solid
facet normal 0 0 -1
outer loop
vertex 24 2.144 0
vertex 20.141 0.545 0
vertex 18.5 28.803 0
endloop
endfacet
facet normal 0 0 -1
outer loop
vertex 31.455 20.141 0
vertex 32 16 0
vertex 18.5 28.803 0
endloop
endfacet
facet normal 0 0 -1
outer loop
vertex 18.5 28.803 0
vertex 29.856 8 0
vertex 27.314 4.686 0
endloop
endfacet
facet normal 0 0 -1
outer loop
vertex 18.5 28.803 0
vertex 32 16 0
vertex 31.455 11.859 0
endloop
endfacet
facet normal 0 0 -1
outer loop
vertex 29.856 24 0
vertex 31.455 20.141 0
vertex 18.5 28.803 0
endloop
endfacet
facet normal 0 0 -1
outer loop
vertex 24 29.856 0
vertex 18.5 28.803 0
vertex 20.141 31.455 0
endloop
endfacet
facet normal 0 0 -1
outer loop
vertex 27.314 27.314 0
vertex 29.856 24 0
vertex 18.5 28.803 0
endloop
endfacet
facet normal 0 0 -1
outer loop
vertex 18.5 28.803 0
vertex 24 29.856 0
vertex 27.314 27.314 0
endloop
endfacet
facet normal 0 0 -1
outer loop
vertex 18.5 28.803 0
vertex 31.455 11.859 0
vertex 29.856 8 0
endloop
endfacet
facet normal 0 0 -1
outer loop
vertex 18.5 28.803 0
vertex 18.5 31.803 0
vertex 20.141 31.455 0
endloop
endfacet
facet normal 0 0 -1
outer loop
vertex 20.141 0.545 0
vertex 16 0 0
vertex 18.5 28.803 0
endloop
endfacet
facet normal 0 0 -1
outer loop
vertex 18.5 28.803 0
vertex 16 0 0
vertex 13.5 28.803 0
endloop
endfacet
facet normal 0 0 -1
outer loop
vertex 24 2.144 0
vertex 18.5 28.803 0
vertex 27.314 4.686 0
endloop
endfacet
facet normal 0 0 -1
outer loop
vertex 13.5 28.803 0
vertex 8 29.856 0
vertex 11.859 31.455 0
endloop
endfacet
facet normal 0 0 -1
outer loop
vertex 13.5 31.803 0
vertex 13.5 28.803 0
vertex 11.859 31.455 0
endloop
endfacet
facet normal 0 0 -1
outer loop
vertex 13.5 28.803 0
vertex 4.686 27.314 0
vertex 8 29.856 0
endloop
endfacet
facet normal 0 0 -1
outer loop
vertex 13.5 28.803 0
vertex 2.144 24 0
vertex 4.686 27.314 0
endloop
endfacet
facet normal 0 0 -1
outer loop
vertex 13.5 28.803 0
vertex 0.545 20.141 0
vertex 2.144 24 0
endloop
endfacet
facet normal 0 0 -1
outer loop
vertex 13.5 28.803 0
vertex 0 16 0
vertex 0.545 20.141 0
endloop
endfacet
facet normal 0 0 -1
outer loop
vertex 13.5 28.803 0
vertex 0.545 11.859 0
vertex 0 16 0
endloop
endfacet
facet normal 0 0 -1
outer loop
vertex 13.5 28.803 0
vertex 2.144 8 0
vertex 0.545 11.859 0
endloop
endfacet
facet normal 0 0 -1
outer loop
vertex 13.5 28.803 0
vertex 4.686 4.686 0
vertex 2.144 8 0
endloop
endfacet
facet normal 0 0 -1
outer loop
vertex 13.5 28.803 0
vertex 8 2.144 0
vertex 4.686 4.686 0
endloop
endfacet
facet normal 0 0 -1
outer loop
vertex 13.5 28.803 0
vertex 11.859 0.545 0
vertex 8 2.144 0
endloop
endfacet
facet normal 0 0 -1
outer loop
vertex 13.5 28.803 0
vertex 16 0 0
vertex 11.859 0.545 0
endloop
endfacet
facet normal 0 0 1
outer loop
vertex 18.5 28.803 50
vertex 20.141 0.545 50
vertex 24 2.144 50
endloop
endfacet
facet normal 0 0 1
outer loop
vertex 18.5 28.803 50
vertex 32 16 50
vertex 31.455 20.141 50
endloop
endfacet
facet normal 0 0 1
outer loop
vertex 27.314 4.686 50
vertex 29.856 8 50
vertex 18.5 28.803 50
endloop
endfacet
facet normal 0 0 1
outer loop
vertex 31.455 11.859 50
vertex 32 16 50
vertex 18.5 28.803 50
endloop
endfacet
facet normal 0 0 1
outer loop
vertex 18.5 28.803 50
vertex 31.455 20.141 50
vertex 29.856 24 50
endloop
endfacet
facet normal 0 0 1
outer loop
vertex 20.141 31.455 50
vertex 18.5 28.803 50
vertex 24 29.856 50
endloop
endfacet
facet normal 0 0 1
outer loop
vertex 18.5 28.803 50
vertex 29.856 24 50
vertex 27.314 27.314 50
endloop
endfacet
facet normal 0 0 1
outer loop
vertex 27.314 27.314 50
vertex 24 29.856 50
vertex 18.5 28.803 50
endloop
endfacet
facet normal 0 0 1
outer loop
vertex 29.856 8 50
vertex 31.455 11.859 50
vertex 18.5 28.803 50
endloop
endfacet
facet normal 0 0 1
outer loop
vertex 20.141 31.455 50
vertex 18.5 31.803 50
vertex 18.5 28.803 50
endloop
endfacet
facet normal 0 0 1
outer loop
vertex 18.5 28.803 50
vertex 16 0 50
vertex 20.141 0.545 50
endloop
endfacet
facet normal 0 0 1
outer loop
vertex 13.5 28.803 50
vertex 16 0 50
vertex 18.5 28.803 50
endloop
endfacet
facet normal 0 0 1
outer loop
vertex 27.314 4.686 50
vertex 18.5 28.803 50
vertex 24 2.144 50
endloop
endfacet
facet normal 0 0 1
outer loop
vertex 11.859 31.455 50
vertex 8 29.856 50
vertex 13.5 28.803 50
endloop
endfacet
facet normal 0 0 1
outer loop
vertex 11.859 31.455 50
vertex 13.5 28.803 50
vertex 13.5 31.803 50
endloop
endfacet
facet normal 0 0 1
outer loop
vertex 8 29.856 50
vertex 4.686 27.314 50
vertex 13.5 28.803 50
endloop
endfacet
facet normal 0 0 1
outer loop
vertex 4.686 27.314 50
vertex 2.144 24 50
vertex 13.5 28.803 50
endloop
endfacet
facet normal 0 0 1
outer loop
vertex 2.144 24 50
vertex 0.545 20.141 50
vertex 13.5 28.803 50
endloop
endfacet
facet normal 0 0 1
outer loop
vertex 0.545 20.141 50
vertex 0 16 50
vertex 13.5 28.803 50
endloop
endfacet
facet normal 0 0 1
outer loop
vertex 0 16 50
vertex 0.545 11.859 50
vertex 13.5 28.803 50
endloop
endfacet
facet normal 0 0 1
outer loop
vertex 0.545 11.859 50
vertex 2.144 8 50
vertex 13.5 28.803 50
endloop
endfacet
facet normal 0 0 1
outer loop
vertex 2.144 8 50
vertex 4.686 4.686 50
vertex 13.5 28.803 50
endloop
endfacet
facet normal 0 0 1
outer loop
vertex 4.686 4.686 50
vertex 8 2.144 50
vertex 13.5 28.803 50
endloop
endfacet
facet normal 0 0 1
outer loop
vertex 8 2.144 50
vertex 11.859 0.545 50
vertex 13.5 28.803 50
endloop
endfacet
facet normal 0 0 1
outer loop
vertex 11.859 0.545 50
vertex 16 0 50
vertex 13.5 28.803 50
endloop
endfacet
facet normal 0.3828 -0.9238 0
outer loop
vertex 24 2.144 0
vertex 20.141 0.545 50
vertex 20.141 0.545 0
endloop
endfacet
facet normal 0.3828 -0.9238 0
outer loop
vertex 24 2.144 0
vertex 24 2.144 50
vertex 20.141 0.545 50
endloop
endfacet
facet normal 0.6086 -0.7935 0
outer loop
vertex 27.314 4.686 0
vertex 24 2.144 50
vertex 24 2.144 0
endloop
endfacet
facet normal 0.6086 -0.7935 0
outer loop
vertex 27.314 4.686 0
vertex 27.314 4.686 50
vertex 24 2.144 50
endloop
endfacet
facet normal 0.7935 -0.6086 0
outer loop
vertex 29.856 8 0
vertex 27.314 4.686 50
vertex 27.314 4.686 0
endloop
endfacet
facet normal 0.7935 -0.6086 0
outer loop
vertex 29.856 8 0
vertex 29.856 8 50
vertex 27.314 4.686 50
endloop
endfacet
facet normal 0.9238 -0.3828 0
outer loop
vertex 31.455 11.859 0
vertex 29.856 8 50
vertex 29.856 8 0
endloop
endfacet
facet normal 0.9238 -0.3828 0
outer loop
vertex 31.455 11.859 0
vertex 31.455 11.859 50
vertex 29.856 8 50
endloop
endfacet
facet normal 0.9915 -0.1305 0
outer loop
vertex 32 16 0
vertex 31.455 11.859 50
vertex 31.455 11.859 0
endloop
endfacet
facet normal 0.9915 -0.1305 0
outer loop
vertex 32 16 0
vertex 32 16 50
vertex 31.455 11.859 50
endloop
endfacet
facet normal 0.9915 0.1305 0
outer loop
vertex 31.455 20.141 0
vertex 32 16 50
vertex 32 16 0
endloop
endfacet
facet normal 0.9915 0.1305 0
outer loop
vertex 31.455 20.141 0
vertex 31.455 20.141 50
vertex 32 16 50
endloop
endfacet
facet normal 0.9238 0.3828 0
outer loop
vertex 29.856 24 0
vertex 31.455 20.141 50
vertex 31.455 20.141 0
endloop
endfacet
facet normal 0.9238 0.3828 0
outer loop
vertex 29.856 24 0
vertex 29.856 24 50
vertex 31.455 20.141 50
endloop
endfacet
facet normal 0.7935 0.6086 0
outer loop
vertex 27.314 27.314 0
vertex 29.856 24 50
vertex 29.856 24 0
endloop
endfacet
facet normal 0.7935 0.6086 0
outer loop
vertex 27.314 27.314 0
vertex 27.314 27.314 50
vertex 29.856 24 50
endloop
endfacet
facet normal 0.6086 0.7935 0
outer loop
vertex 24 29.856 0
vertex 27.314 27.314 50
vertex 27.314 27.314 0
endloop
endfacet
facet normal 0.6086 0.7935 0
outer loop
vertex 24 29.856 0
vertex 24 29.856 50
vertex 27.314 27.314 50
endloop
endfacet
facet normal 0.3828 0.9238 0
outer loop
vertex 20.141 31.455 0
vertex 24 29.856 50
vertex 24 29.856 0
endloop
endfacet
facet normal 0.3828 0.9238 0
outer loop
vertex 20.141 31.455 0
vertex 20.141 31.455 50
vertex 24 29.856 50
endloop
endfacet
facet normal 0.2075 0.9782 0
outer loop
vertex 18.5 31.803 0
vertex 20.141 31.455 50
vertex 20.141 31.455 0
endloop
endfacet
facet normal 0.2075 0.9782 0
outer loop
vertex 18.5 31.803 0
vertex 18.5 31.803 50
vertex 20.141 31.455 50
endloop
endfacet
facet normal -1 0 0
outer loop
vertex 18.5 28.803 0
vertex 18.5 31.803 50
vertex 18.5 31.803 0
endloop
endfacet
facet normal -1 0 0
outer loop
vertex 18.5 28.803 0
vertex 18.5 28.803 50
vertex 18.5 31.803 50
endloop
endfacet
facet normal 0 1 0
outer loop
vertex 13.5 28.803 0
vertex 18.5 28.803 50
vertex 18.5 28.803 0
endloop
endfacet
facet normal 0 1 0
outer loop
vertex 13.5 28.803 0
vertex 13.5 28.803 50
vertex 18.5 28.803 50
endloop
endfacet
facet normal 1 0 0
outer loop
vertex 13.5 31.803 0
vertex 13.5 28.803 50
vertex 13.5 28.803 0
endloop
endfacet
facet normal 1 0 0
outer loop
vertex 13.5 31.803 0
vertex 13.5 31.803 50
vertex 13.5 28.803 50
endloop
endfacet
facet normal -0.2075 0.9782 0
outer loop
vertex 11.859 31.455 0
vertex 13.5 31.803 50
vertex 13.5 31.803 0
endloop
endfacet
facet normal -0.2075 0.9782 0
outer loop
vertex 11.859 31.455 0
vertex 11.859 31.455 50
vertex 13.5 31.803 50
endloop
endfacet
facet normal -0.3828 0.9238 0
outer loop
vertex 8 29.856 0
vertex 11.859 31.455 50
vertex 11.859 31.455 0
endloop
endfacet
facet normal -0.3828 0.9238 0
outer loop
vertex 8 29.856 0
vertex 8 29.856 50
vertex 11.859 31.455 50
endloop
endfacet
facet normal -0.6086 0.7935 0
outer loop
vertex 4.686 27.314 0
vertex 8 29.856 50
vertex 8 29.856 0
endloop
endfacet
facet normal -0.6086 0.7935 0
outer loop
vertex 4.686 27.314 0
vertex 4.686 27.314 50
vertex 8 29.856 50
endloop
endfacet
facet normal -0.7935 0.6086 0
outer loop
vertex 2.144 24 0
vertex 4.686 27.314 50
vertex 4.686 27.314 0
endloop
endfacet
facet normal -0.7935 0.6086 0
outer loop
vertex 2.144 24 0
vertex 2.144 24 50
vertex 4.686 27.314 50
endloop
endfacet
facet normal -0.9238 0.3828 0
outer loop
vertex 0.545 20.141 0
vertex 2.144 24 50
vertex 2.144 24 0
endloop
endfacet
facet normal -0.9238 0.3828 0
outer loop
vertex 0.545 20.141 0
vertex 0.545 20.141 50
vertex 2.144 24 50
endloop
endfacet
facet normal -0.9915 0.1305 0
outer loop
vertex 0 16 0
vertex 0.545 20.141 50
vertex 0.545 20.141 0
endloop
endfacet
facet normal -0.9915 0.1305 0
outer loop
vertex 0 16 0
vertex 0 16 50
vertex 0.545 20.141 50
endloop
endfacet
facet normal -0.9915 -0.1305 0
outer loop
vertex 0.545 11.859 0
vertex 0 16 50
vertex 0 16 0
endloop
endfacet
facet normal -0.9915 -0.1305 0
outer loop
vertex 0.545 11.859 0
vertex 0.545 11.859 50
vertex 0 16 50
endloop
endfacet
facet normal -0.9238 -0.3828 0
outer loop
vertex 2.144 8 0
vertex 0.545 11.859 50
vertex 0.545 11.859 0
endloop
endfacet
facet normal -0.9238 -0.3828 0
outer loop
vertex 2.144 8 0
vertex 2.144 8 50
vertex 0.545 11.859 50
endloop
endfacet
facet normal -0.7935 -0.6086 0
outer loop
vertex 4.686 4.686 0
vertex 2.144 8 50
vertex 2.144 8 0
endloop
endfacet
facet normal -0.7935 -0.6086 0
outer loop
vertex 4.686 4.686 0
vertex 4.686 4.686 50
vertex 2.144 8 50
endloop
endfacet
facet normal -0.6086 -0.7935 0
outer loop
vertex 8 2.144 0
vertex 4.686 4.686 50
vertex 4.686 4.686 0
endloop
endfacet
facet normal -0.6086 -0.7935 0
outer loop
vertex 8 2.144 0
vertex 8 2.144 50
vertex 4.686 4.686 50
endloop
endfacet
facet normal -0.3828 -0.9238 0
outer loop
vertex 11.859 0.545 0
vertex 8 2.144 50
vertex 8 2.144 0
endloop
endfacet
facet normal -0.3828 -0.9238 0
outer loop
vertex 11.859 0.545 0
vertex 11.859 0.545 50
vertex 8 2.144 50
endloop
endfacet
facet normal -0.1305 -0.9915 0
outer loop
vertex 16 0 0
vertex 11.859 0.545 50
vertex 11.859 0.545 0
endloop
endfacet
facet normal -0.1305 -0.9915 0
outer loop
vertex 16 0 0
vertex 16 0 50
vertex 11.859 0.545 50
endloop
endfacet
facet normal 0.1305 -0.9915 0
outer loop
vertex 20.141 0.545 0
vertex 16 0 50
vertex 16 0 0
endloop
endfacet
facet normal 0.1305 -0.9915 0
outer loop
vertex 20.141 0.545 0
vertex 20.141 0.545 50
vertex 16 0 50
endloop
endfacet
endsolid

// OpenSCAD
$fn = 32;

// ----------------------------------------------------------------------
// Keyway shaft: d32 shaft, key 5 x 3 mm
// ----------------------------------------------------------------------

// --- parameters (mm) ---
shaft_r = 16;             // shaft radius
key_w = 5;                // keyway width
key_d = 3;                // keyway depth below the surface line
plate_t = 50;             // shaft length, Z (extrusion height)

shaft_d = 2 * shaft_r;  // shaft diameter
circle_step = 15;  // polygon sampling step, degrees

profile = [[11.859, 31.455], [8, 29.856], [4.686, 27.314], [2.144, 24], [0.545, 20.141], [0, 16], [0.545, 11.859], [2.144, 8], [4.686, 4.686], [8, 2.144], [11.859, 0.545], [16, 0], [20.141, 0.545], [24, 2.144], [27.314, 4.686], [29.856, 8], [31.455, 11.859], [32, 16], [31.455, 20.141], [29.856, 24], [27.314, 27.314], [24, 29.856], [20.141, 31.455], [18.5, 31.803], [18.5, 28.803], [13.5, 28.803], [13.5, 31.803]];  // primary outline, 27 points, counter clockwise

// --- the one profile operation ---
linear_extrude(height = plate_t) polygon(points = profile);
